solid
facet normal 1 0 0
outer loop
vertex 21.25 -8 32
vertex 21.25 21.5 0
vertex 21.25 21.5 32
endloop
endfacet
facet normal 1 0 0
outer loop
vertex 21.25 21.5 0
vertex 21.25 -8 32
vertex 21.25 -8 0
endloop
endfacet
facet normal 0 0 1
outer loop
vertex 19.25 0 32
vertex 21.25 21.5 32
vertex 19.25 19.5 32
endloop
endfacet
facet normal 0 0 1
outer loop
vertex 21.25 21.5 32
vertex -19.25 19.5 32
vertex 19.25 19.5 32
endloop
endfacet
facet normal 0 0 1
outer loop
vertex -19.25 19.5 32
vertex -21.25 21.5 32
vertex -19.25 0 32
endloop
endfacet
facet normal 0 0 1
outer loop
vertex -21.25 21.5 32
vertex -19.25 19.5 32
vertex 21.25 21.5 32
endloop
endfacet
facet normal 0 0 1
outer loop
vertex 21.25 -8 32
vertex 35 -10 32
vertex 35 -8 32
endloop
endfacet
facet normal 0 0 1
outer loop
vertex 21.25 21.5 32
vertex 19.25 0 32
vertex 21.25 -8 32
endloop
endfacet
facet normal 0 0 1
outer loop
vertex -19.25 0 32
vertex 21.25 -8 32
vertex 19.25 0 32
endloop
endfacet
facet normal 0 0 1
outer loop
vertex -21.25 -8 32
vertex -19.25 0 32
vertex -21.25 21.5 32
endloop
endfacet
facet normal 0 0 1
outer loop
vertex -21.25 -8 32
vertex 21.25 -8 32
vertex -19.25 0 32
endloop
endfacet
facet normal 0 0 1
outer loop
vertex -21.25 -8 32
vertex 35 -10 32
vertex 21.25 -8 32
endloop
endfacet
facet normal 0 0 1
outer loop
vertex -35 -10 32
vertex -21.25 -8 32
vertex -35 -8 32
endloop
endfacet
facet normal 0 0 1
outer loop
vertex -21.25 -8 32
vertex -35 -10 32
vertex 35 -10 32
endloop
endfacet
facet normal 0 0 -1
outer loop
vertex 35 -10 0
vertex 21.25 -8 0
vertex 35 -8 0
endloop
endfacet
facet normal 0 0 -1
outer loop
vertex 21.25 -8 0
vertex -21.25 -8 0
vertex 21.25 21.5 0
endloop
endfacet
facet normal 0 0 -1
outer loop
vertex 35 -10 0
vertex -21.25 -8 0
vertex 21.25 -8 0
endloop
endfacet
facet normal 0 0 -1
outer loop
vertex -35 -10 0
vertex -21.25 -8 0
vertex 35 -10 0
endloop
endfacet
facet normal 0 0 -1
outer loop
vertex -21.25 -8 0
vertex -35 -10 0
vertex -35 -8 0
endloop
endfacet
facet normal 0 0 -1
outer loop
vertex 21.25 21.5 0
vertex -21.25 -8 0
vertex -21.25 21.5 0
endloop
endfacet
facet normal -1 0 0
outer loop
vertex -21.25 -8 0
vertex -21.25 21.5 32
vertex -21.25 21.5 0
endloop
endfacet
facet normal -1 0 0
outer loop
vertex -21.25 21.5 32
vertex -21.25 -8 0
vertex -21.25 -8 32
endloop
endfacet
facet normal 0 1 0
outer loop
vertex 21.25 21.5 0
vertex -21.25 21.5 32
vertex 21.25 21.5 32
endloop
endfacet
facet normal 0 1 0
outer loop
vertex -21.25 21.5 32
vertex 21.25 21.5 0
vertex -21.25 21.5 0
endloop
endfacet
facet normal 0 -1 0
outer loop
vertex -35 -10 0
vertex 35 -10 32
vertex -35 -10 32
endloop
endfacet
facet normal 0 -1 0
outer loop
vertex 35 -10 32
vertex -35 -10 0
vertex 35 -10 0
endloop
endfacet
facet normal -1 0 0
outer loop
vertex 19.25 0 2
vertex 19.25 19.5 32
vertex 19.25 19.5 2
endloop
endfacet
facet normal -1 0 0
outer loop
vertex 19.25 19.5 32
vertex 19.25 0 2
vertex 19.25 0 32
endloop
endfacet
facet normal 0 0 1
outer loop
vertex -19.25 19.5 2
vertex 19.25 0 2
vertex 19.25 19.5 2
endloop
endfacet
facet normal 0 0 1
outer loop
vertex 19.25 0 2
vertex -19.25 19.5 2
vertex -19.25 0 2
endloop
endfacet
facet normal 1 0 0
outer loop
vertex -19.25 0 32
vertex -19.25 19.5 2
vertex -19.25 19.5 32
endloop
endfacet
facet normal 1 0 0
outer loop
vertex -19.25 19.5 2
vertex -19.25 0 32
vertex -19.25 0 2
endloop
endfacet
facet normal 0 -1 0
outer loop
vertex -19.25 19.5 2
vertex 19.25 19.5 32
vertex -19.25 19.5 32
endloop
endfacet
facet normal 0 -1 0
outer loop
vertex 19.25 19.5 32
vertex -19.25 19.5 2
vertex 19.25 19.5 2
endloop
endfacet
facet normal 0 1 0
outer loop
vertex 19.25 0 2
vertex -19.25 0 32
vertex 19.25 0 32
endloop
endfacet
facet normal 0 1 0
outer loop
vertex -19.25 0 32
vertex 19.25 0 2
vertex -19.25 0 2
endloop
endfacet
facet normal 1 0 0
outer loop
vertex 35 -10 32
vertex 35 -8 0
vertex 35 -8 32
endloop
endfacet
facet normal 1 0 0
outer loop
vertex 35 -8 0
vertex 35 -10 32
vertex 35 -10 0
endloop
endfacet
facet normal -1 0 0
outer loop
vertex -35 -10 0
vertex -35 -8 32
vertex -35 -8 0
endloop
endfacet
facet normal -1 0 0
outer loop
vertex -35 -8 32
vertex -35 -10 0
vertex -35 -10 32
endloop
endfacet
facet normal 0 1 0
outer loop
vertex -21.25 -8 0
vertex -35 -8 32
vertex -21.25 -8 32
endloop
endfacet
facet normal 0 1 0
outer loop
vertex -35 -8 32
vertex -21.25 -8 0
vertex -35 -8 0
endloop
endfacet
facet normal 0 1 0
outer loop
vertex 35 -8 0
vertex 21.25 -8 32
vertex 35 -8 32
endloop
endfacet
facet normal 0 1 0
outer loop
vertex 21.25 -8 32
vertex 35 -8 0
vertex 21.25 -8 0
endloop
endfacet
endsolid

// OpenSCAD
// A box for holding Clas Ohlson temperature and humidity
// sensor. https://www.clasohlson.com/fi/Lampotila-anturi---kosteusmittari/p/36-6726

wall = 2;
meter_width = 38.5;
meter_depth = 19.5;
extra_plate = 70;
cupsize = 30; // Depth of the cup where meter is dropped
extraction = 10; // To make RF conditions better

difference() {
    translate([0,(meter_depth+wall-extraction)/2,(cupsize+wall)/2]) {
        cube([meter_width+2*wall,meter_depth+wall+extraction,cupsize+wall], center=true);
    }
    
    translate([0,meter_depth/2,cupsize/2+wall]) {
        cube([meter_width,meter_depth,cupsize], center=true);
    }
}

translate([-extra_plate/2,-extraction,0]) {
    cube([extra_plate, wall, cupsize+wall]);
}
